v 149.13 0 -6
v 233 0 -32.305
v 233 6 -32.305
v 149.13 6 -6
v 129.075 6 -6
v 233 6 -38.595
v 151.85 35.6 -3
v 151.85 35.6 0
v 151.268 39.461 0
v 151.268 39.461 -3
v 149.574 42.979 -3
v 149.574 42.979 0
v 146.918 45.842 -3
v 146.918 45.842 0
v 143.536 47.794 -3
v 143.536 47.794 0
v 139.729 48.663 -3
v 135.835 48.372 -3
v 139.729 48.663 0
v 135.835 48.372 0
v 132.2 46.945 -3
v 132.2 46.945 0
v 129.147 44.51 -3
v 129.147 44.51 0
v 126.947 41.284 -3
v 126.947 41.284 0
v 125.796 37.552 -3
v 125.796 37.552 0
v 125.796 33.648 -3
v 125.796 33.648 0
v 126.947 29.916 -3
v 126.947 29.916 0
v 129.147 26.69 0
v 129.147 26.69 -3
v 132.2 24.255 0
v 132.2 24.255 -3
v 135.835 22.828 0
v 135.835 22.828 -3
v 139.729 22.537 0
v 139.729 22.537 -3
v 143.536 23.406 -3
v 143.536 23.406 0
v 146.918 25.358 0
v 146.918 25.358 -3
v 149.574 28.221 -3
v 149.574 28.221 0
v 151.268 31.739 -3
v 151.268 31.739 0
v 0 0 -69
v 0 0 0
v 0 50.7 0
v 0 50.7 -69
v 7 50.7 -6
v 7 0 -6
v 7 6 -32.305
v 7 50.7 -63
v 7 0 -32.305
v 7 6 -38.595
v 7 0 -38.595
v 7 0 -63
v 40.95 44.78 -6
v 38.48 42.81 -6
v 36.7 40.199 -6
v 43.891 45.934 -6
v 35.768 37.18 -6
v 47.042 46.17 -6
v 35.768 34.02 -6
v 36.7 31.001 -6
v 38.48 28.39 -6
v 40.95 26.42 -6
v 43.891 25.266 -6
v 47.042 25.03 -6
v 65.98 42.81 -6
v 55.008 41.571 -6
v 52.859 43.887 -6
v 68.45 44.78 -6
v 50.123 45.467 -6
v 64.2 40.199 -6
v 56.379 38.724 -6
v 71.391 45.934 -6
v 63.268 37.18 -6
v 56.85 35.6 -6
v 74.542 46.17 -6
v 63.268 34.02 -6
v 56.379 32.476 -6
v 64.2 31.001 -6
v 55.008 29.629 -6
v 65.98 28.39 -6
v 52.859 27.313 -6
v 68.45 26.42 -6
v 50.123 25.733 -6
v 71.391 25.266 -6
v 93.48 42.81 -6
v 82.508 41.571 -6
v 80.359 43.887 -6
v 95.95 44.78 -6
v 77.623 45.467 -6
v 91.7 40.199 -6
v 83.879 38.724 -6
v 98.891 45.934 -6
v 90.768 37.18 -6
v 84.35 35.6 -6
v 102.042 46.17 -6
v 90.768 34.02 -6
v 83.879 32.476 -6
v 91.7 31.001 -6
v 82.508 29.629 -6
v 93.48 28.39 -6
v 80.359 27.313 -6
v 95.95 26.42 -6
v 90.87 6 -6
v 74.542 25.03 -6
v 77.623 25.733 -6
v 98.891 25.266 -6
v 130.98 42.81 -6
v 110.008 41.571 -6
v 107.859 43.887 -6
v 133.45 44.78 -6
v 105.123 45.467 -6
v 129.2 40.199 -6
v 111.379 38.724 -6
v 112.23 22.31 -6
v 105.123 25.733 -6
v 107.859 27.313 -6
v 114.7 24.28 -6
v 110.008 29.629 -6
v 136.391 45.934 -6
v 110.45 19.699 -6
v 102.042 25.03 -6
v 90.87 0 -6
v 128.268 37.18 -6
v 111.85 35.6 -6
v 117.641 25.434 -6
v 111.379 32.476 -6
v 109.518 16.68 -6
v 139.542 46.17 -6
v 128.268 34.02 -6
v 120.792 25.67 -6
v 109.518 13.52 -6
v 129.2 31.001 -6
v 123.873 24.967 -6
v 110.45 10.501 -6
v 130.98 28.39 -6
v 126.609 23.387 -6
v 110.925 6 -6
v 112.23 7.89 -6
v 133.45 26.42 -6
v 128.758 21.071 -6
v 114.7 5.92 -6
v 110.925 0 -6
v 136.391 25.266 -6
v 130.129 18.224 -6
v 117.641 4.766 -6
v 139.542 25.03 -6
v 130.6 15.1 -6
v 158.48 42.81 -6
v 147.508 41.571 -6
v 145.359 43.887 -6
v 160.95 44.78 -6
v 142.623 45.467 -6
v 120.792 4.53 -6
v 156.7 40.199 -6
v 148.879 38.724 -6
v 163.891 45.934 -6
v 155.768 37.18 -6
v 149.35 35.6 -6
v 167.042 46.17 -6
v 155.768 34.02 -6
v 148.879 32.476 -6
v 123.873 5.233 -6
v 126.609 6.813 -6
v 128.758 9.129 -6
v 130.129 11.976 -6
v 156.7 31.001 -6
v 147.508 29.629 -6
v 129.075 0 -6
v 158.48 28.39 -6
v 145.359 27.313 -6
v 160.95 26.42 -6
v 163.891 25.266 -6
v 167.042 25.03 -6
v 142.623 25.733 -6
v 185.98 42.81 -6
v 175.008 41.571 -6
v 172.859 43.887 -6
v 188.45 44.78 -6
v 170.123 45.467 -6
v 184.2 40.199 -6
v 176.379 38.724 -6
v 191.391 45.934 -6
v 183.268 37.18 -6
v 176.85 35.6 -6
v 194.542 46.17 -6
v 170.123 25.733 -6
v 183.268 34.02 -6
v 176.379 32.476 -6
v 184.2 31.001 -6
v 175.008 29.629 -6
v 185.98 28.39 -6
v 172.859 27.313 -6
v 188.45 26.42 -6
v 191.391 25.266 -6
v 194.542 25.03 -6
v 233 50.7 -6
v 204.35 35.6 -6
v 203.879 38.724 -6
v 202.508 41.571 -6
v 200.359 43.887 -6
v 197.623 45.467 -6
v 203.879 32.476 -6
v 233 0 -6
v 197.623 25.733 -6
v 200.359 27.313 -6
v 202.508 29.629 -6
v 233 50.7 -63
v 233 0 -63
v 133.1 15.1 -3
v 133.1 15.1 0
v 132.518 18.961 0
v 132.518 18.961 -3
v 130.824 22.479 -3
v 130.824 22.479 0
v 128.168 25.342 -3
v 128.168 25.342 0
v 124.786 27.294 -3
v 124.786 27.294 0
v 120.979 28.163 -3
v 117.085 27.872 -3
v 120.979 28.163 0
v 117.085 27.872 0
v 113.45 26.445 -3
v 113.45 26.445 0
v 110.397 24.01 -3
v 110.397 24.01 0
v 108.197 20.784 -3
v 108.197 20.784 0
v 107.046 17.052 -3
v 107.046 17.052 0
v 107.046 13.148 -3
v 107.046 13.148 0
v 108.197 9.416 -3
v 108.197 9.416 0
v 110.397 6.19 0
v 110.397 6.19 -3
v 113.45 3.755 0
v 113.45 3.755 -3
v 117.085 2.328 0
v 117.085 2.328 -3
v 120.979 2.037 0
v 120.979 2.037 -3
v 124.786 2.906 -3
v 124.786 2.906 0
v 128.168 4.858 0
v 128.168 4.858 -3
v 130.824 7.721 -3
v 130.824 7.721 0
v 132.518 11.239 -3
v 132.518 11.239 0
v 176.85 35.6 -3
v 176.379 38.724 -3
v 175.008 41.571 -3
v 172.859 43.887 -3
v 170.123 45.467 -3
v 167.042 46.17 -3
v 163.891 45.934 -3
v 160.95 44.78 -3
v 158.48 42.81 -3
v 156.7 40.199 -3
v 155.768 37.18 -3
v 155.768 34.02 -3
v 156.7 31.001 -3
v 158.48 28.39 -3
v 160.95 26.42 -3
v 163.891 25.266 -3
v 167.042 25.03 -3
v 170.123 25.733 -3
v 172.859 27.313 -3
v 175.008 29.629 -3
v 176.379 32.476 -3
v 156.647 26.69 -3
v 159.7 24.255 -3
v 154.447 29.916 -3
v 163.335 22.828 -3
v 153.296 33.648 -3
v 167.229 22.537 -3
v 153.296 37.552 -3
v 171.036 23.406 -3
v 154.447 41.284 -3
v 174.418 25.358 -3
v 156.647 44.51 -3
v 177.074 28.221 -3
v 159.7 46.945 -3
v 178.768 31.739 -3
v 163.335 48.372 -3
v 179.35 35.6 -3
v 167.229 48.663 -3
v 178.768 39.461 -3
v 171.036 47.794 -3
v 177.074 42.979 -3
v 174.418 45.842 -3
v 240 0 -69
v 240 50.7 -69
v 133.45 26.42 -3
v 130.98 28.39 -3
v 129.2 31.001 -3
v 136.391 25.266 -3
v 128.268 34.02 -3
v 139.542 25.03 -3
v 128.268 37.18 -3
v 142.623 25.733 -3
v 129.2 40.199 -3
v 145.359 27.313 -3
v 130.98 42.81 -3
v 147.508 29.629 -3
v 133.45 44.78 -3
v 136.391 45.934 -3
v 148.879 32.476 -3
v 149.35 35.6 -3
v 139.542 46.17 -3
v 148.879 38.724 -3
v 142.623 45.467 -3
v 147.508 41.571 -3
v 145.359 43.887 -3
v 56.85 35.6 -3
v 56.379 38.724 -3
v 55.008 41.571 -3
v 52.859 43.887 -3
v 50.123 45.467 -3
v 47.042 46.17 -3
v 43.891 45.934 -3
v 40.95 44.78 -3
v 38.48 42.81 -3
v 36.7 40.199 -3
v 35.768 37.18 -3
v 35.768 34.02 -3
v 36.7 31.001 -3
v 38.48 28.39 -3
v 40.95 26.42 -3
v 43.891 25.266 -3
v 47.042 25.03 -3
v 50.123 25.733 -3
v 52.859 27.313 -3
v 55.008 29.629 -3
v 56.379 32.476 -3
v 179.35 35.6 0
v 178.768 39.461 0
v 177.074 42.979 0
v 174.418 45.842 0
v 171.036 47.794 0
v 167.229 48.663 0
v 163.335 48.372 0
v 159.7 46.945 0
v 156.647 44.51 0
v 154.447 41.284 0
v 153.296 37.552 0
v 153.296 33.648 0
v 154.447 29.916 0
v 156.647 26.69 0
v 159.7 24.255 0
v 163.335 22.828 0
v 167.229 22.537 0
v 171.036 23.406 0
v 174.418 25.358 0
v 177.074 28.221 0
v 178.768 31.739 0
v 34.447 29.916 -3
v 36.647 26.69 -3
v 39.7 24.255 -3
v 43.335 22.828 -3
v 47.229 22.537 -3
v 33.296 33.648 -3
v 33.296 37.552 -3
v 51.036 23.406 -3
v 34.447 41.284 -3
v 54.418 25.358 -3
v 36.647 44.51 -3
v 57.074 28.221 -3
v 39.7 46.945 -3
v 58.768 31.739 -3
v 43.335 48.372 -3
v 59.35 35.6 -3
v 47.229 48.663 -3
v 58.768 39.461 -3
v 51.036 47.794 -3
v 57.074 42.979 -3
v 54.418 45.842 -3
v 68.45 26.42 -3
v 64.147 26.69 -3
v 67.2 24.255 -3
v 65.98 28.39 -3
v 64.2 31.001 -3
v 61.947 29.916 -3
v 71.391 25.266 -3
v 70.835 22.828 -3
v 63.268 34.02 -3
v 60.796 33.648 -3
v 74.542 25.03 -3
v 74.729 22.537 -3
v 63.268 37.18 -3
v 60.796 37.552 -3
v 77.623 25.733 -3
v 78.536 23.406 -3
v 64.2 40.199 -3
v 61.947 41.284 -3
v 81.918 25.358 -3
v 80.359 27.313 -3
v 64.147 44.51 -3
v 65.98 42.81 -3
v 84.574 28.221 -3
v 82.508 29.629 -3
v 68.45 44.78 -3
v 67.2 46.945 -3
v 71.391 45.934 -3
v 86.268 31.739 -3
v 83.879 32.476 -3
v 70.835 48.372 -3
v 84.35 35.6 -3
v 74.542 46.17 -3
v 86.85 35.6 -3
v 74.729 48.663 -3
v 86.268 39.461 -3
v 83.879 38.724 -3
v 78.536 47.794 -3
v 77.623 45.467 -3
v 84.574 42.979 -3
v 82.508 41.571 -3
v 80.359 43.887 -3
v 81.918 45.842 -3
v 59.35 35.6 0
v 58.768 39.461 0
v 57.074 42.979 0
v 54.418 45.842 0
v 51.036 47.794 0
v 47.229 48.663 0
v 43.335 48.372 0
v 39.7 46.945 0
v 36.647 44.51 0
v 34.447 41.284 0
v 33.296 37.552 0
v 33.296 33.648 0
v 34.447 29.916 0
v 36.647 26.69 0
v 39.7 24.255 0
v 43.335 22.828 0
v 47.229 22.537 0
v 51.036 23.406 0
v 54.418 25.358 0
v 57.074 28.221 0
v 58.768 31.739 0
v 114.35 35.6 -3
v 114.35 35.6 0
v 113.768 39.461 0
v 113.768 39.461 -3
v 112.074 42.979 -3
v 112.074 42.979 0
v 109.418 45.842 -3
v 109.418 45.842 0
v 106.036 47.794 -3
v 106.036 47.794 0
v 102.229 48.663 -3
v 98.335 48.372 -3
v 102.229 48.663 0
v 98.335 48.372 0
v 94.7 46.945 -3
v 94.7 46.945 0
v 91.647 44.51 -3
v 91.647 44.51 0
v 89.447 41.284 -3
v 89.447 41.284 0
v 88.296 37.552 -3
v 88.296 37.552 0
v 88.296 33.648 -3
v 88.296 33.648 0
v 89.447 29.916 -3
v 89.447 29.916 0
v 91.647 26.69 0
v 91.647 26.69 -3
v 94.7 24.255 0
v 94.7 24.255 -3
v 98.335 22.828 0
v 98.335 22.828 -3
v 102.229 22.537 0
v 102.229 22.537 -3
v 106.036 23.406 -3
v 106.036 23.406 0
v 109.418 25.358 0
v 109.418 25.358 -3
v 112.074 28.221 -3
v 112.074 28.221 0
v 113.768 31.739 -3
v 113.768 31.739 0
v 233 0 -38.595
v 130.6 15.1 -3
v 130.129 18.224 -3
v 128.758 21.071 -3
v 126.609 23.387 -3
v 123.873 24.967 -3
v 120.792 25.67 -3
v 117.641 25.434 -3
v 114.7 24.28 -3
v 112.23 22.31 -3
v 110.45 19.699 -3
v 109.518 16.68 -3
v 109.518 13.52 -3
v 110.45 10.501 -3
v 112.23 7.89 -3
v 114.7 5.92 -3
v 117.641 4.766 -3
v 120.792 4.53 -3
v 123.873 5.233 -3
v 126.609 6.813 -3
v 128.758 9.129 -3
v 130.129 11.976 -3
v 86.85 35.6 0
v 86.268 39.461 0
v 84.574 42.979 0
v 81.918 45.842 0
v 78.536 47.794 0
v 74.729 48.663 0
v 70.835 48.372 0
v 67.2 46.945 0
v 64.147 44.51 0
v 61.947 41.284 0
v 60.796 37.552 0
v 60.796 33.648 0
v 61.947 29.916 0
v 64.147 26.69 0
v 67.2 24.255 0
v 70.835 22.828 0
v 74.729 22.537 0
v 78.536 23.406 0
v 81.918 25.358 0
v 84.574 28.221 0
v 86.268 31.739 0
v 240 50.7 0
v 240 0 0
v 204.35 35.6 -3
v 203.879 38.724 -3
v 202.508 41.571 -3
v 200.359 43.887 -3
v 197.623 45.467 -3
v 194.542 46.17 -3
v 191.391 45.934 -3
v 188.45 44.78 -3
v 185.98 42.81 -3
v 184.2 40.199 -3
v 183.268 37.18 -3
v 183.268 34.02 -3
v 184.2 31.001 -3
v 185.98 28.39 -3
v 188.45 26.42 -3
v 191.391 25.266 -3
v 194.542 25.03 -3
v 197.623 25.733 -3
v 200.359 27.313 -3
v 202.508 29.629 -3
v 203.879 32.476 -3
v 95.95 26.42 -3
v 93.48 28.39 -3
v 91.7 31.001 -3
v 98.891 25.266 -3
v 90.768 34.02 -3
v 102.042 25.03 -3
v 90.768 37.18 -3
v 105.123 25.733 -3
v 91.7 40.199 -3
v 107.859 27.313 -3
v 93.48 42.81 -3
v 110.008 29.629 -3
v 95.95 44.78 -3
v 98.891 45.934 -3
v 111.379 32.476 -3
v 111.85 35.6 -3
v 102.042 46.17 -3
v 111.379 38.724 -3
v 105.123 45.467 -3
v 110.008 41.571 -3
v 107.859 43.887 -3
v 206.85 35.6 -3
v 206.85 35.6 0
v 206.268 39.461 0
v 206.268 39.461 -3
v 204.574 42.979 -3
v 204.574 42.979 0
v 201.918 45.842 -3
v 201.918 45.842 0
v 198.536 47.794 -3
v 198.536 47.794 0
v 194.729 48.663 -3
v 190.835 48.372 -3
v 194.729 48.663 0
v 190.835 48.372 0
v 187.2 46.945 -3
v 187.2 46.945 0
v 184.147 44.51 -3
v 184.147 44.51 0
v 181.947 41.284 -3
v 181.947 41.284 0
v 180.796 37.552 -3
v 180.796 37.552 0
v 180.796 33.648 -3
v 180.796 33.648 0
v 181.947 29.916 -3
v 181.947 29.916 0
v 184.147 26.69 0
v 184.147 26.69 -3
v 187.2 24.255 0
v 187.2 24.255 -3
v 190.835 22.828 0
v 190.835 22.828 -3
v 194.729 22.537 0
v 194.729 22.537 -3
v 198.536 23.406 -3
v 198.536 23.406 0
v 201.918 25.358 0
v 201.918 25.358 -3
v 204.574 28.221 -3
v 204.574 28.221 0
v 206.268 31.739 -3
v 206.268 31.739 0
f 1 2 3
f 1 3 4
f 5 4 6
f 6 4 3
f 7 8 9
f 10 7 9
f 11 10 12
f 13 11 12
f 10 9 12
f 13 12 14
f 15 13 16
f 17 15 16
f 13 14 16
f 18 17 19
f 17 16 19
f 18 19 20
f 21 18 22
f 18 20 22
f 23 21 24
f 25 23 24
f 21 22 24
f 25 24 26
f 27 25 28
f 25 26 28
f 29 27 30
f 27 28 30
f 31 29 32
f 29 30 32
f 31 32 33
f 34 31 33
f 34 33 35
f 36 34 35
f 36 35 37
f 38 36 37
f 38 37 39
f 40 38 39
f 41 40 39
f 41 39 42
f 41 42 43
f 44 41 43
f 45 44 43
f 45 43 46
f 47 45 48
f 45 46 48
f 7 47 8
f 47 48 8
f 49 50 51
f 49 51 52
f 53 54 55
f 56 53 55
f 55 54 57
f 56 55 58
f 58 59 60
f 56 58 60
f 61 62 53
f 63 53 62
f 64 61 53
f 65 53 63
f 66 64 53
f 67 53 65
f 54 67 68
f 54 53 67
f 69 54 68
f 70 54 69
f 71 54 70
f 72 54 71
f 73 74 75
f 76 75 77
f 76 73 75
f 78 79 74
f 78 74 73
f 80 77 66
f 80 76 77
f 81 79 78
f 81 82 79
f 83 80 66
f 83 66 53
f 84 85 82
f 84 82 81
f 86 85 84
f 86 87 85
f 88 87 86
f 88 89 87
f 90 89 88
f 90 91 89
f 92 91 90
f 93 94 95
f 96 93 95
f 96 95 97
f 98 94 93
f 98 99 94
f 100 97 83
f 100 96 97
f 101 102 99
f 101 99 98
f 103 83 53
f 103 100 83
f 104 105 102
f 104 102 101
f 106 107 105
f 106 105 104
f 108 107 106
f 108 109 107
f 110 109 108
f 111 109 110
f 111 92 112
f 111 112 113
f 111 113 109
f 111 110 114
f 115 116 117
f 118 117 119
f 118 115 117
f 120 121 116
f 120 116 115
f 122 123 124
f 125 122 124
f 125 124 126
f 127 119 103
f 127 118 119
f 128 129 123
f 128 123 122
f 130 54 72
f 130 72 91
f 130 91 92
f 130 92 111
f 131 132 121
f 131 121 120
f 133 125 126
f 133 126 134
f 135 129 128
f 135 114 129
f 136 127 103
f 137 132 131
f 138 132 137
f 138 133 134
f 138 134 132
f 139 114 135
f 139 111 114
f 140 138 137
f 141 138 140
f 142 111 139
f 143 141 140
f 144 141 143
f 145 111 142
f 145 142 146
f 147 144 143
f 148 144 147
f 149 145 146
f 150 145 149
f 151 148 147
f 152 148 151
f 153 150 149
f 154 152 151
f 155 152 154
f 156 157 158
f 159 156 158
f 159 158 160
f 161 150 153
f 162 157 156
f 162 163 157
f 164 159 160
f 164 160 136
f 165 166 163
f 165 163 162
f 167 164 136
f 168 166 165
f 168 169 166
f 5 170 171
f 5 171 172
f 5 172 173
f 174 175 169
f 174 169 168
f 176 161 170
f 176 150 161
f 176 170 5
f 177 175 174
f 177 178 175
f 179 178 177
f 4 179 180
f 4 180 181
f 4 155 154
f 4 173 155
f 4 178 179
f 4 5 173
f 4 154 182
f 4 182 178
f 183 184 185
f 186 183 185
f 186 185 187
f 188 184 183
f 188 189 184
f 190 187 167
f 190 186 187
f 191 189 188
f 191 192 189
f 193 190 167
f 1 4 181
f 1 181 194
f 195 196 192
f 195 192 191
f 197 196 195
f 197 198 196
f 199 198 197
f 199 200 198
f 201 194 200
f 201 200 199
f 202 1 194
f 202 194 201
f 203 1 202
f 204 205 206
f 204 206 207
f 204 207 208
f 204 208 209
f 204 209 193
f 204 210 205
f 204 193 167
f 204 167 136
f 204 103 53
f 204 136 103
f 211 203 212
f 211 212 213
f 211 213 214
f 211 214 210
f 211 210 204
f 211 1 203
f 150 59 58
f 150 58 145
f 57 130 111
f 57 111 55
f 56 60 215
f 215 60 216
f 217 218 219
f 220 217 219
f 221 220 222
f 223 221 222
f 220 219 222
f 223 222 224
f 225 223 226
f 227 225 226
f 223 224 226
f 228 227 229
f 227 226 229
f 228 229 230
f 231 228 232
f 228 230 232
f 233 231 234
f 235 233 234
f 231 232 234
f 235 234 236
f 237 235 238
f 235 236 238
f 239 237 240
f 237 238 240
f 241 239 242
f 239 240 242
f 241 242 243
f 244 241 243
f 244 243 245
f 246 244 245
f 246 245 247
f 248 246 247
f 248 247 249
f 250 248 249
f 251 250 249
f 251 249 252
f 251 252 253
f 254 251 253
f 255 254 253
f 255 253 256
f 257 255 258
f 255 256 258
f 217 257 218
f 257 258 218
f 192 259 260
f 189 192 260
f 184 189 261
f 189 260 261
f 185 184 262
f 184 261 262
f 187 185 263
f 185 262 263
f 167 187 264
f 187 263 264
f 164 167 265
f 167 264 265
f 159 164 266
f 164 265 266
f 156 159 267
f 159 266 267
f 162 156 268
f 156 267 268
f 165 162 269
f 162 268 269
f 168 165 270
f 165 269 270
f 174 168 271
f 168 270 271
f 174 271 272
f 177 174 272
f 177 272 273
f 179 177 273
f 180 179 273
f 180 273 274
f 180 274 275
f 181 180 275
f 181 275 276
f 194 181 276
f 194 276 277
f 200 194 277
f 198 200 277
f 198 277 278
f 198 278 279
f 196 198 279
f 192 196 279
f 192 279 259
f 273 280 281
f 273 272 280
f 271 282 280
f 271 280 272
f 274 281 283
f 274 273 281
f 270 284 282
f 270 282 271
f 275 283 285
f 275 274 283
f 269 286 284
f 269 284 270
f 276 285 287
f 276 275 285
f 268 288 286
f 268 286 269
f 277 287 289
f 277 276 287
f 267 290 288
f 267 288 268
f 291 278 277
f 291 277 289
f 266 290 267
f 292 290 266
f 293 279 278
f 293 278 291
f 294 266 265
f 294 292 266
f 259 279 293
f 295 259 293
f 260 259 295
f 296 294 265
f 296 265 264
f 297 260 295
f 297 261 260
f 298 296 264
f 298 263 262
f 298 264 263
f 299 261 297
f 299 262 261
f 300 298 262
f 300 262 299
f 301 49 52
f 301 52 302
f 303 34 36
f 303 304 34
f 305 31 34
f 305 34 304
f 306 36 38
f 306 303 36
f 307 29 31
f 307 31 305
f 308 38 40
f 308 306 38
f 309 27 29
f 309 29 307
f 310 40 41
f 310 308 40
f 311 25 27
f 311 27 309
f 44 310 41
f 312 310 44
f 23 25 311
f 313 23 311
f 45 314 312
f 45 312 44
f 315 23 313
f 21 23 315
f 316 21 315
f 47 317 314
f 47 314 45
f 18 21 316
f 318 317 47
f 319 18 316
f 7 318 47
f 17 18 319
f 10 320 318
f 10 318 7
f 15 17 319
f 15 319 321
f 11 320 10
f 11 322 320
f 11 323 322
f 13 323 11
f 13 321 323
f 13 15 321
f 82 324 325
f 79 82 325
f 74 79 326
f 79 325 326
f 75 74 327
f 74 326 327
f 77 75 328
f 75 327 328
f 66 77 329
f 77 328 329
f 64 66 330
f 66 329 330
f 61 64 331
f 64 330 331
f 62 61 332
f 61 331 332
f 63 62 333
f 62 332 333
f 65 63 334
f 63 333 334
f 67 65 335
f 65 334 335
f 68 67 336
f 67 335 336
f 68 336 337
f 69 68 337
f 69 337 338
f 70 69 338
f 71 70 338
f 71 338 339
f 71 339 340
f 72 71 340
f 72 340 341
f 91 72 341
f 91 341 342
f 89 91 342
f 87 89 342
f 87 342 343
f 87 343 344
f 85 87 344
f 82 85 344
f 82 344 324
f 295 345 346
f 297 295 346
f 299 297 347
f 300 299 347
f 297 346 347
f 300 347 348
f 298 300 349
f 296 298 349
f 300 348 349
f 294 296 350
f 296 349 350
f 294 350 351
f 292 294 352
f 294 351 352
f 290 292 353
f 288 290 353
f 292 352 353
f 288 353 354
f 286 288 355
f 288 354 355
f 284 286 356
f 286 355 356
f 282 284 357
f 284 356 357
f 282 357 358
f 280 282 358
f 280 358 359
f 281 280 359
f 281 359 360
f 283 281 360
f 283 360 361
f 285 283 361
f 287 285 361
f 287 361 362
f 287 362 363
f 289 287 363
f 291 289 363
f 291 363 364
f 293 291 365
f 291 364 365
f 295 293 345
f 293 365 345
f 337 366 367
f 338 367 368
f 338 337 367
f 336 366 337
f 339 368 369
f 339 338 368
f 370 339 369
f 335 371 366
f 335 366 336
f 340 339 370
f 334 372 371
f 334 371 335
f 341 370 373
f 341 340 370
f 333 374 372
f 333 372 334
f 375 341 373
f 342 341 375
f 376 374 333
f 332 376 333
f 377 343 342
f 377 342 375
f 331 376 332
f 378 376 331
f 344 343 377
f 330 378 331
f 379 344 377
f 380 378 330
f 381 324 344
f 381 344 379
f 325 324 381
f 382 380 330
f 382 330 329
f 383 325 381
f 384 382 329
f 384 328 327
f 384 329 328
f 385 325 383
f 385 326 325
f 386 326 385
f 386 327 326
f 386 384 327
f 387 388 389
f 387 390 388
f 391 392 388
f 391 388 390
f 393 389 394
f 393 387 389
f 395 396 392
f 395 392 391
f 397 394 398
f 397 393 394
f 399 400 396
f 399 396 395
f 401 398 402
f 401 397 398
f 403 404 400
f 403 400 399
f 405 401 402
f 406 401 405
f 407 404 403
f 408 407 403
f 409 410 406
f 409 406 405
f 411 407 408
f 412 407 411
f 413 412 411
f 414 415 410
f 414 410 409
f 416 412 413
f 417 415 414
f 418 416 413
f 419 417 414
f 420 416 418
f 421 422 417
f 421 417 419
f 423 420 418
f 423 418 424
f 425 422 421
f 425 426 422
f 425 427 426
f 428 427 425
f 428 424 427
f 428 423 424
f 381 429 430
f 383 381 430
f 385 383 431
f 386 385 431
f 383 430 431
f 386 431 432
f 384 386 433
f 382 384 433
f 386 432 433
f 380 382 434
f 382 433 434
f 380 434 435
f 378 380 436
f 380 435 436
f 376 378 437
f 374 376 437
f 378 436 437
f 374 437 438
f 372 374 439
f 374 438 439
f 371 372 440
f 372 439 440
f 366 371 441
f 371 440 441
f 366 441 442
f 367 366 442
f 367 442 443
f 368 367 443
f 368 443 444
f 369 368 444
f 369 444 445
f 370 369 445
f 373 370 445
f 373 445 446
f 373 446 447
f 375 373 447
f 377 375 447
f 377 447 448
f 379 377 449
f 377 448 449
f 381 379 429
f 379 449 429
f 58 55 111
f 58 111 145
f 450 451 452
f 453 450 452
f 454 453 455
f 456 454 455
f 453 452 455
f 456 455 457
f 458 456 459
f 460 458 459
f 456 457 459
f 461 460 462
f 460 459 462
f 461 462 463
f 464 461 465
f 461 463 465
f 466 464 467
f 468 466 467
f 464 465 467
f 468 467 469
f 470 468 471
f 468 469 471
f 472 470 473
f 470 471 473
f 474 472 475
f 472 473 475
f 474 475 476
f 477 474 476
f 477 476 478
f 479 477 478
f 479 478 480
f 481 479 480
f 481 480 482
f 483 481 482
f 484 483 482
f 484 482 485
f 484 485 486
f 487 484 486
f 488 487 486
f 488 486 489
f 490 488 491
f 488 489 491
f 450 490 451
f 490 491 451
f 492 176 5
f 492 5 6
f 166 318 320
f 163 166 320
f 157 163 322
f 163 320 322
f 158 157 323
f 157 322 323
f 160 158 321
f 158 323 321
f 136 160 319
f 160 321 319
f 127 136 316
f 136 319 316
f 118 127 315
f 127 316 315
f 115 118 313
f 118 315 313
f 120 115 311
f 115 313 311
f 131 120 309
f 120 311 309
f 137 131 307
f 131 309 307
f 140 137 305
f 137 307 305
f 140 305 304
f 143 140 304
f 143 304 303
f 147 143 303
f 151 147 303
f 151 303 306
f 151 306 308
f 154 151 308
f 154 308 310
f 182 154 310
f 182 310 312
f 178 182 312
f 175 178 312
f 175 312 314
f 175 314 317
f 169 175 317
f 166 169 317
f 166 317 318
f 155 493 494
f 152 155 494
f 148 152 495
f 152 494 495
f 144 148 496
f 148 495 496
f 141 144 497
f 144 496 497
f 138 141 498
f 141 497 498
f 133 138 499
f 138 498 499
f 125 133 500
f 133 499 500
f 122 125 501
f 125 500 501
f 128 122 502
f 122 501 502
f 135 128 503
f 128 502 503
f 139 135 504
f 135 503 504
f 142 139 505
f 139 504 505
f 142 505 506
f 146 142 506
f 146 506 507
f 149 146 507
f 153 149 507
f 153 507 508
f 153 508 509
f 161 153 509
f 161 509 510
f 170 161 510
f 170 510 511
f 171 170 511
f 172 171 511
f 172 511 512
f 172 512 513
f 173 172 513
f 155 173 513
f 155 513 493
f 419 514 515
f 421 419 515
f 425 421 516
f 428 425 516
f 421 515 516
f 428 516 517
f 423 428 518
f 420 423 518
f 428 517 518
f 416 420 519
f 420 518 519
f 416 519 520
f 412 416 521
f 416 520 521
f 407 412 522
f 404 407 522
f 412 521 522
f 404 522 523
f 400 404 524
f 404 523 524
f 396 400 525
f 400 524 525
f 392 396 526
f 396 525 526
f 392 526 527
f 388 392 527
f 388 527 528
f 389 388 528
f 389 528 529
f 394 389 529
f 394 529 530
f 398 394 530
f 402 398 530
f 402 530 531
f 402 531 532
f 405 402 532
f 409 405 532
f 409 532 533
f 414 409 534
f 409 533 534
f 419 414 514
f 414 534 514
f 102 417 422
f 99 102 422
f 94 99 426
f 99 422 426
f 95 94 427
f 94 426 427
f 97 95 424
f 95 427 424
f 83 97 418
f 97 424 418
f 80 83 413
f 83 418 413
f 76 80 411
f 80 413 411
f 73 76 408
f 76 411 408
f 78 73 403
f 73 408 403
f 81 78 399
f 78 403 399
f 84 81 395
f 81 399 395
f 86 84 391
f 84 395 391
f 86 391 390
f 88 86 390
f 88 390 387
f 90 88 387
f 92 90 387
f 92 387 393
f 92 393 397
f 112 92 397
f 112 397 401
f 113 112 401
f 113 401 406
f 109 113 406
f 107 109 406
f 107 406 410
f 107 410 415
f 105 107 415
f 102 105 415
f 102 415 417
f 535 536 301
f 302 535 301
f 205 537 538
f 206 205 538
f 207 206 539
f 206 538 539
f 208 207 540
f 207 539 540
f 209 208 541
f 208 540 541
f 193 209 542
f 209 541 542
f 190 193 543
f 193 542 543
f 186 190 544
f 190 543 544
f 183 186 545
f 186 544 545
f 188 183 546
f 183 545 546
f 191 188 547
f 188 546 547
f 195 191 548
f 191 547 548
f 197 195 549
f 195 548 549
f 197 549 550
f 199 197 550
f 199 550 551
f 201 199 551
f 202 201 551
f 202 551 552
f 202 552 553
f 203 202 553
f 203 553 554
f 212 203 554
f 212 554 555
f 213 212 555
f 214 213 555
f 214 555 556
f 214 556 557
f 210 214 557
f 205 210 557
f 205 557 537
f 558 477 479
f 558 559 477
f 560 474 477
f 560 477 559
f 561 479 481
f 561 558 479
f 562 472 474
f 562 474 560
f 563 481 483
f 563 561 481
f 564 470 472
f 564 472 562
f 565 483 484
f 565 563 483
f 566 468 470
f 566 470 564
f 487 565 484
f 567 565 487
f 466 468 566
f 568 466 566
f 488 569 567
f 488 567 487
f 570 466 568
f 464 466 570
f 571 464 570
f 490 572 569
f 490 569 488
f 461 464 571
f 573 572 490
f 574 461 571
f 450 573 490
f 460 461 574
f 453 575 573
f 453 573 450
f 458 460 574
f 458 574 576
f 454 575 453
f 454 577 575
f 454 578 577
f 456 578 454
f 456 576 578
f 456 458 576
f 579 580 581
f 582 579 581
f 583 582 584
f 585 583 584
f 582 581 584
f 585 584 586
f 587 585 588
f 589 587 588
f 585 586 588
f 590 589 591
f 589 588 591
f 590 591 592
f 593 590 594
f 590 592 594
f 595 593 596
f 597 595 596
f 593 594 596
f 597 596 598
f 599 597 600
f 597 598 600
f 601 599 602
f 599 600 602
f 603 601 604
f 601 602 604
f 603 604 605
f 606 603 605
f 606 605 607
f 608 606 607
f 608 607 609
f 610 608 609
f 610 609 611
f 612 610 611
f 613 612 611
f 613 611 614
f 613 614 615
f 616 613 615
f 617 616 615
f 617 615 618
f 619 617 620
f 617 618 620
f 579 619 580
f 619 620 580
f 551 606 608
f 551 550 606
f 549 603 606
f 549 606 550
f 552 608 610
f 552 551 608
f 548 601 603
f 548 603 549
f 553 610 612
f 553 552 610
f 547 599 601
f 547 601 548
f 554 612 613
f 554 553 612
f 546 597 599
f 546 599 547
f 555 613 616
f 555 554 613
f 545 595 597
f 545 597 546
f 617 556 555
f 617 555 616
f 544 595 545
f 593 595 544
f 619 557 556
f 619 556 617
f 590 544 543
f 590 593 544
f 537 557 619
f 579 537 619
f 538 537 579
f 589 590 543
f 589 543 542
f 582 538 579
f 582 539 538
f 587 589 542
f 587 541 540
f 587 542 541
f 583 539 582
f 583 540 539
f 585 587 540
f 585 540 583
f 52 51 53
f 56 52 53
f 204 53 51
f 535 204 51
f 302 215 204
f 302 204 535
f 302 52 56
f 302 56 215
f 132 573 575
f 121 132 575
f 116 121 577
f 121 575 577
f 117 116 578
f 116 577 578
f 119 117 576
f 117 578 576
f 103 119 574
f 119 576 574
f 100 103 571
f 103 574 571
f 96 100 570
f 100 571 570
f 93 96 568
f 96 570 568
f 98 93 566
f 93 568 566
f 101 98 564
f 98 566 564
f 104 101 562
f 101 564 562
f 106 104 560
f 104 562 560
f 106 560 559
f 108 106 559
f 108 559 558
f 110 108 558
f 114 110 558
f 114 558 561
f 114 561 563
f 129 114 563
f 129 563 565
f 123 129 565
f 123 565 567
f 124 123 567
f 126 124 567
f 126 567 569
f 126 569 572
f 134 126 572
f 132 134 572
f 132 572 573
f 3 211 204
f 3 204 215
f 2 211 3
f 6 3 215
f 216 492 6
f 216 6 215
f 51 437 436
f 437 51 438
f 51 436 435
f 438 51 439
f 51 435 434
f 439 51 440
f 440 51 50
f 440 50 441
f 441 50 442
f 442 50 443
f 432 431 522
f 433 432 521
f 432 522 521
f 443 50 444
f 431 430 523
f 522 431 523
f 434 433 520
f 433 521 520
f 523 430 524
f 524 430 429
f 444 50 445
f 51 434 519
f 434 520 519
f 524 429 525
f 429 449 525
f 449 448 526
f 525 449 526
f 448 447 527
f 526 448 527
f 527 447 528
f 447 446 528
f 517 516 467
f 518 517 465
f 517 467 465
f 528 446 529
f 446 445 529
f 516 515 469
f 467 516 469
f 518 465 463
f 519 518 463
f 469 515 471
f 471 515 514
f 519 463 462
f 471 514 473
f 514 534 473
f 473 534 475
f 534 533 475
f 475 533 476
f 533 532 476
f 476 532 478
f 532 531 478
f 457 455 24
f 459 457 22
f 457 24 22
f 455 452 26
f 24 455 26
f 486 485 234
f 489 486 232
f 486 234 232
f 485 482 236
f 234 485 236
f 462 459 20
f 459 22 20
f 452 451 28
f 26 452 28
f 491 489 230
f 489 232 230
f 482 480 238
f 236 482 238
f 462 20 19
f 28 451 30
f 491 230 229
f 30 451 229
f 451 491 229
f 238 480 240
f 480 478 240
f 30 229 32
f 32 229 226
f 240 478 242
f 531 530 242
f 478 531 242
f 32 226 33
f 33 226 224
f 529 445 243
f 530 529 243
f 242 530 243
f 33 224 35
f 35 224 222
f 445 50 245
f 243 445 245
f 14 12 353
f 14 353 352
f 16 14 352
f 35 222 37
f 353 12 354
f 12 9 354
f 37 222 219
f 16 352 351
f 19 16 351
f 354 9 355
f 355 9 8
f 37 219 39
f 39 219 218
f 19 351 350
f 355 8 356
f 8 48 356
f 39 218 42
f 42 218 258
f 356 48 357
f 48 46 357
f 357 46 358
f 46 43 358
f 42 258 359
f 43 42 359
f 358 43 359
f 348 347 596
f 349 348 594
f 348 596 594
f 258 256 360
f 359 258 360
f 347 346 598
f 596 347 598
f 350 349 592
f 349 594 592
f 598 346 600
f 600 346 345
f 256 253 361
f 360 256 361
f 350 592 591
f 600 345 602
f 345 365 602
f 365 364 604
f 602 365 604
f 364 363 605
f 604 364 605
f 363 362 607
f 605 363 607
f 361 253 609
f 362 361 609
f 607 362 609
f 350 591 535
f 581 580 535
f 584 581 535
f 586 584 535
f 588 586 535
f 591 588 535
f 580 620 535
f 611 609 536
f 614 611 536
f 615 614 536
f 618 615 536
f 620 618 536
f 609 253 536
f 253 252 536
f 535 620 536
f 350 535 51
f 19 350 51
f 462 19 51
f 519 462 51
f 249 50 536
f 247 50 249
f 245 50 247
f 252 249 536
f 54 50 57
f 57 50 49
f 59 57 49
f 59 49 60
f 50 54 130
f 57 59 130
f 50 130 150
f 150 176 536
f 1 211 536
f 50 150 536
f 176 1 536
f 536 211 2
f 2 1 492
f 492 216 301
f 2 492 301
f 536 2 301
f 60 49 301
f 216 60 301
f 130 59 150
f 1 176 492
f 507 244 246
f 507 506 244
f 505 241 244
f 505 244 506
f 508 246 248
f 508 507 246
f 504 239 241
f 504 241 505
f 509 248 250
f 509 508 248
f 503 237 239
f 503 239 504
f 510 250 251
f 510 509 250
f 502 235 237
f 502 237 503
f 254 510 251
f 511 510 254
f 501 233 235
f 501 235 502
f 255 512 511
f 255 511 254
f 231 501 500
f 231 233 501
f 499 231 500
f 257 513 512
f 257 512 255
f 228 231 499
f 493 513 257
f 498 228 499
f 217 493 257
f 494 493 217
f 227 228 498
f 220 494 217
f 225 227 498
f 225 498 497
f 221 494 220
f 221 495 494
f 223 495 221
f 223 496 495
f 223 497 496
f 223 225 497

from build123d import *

# Parameters (mm, degrees)
SKICA1_W                 = 240
SKICA1_H                 = 69
SKICA1_W_2               = 226
SKICA1_H_2               = 57
P_IDAT_VYSUNUT_M1_DEPTH  = 50.7
SKICA2_R                 = 13.1
ODEBRAT_VYSUNUT_M1_DEPTH = 3
SKICA4_R                 = 10.6
ODEBRAT_VYSUNUT_M2_DEPTH = 6
P_IDAT_VYSUNUT_M2_DEPTH  = 6


with BuildPart() as part:
    # Skica1 → Přidat vysunutím1 (new body)
    with BuildSketch(Plane(origin=(0, 0, 0), x_dir=(1, 0, 0), z_dir=(0, 1, 0))):
        with Locations((120, 34.5)):
            Rectangle(SKICA1_W, SKICA1_H)
        with Locations((120, 34.5)):
            Rectangle(SKICA1_W_2, SKICA1_H_2, mode=Mode.SUBTRACT)
    extrude(amount=P_IDAT_VYSUNUT_M1_DEPTH)

    # Skica2 → Odebrat vysunutím1 (cut)
    with BuildSketch(Plane.XY):
        with Locations((46.25, 35.6)):
            Circle(SKICA2_R)
        with Locations((73.75, 35.6)):
            Circle(SKICA2_R)
        with Locations((101.25, 35.6)):
            Circle(SKICA2_R)
        with Locations((138.75, 35.6)):
            Circle(SKICA2_R)
        with Locations((166.25, 35.6)):
            Circle(SKICA2_R)
        with Locations((193.75, 35.6)):
            Circle(SKICA2_R)
        with Locations((120, 15.1)):
            Circle(SKICA2_R)
    extrude(amount=-ODEBRAT_VYSUNUT_M1_DEPTH, mode=Mode.SUBTRACT)

    # Skica4 → Odebrat vysunutím2 (cut)
    with BuildSketch(Plane.XY):
        with Locations((46.25, 35.6)):
            Circle(SKICA4_R)
        with Locations((73.75, 35.6)):
            Circle(SKICA4_R)
        with Locations((138.75, 35.6)):
            Circle(SKICA4_R)
        with Locations((101.25, 35.6)):
            Circle(SKICA4_R)
        with Locations((120, 15.1)):
            Circle(SKICA4_R)
        with Locations((166.25, 35.6)):
            Circle(SKICA4_R)
        with Locations((193.75, 35.6)):
            Circle(SKICA4_R)
    extrude(amount=-ODEBRAT_VYSUNUT_M2_DEPTH, mode=Mode.SUBTRACT)

    # Skica5 → Přidat vysunutím2 (add)
    with BuildSketch(Plane.XZ):
        Polygon((149.130434783, -6), (129.075362319, -6), (233, -38.594545455), (233, -32.304545455), align=None)
        Polygon((90.869565217, -6), (7, -32.304545455), (7, -38.594545455), (110.924637681, -6), align=None)
    extrude(amount=-P_IDAT_VYSUNUT_M2_DEPTH)


solid = part.part
